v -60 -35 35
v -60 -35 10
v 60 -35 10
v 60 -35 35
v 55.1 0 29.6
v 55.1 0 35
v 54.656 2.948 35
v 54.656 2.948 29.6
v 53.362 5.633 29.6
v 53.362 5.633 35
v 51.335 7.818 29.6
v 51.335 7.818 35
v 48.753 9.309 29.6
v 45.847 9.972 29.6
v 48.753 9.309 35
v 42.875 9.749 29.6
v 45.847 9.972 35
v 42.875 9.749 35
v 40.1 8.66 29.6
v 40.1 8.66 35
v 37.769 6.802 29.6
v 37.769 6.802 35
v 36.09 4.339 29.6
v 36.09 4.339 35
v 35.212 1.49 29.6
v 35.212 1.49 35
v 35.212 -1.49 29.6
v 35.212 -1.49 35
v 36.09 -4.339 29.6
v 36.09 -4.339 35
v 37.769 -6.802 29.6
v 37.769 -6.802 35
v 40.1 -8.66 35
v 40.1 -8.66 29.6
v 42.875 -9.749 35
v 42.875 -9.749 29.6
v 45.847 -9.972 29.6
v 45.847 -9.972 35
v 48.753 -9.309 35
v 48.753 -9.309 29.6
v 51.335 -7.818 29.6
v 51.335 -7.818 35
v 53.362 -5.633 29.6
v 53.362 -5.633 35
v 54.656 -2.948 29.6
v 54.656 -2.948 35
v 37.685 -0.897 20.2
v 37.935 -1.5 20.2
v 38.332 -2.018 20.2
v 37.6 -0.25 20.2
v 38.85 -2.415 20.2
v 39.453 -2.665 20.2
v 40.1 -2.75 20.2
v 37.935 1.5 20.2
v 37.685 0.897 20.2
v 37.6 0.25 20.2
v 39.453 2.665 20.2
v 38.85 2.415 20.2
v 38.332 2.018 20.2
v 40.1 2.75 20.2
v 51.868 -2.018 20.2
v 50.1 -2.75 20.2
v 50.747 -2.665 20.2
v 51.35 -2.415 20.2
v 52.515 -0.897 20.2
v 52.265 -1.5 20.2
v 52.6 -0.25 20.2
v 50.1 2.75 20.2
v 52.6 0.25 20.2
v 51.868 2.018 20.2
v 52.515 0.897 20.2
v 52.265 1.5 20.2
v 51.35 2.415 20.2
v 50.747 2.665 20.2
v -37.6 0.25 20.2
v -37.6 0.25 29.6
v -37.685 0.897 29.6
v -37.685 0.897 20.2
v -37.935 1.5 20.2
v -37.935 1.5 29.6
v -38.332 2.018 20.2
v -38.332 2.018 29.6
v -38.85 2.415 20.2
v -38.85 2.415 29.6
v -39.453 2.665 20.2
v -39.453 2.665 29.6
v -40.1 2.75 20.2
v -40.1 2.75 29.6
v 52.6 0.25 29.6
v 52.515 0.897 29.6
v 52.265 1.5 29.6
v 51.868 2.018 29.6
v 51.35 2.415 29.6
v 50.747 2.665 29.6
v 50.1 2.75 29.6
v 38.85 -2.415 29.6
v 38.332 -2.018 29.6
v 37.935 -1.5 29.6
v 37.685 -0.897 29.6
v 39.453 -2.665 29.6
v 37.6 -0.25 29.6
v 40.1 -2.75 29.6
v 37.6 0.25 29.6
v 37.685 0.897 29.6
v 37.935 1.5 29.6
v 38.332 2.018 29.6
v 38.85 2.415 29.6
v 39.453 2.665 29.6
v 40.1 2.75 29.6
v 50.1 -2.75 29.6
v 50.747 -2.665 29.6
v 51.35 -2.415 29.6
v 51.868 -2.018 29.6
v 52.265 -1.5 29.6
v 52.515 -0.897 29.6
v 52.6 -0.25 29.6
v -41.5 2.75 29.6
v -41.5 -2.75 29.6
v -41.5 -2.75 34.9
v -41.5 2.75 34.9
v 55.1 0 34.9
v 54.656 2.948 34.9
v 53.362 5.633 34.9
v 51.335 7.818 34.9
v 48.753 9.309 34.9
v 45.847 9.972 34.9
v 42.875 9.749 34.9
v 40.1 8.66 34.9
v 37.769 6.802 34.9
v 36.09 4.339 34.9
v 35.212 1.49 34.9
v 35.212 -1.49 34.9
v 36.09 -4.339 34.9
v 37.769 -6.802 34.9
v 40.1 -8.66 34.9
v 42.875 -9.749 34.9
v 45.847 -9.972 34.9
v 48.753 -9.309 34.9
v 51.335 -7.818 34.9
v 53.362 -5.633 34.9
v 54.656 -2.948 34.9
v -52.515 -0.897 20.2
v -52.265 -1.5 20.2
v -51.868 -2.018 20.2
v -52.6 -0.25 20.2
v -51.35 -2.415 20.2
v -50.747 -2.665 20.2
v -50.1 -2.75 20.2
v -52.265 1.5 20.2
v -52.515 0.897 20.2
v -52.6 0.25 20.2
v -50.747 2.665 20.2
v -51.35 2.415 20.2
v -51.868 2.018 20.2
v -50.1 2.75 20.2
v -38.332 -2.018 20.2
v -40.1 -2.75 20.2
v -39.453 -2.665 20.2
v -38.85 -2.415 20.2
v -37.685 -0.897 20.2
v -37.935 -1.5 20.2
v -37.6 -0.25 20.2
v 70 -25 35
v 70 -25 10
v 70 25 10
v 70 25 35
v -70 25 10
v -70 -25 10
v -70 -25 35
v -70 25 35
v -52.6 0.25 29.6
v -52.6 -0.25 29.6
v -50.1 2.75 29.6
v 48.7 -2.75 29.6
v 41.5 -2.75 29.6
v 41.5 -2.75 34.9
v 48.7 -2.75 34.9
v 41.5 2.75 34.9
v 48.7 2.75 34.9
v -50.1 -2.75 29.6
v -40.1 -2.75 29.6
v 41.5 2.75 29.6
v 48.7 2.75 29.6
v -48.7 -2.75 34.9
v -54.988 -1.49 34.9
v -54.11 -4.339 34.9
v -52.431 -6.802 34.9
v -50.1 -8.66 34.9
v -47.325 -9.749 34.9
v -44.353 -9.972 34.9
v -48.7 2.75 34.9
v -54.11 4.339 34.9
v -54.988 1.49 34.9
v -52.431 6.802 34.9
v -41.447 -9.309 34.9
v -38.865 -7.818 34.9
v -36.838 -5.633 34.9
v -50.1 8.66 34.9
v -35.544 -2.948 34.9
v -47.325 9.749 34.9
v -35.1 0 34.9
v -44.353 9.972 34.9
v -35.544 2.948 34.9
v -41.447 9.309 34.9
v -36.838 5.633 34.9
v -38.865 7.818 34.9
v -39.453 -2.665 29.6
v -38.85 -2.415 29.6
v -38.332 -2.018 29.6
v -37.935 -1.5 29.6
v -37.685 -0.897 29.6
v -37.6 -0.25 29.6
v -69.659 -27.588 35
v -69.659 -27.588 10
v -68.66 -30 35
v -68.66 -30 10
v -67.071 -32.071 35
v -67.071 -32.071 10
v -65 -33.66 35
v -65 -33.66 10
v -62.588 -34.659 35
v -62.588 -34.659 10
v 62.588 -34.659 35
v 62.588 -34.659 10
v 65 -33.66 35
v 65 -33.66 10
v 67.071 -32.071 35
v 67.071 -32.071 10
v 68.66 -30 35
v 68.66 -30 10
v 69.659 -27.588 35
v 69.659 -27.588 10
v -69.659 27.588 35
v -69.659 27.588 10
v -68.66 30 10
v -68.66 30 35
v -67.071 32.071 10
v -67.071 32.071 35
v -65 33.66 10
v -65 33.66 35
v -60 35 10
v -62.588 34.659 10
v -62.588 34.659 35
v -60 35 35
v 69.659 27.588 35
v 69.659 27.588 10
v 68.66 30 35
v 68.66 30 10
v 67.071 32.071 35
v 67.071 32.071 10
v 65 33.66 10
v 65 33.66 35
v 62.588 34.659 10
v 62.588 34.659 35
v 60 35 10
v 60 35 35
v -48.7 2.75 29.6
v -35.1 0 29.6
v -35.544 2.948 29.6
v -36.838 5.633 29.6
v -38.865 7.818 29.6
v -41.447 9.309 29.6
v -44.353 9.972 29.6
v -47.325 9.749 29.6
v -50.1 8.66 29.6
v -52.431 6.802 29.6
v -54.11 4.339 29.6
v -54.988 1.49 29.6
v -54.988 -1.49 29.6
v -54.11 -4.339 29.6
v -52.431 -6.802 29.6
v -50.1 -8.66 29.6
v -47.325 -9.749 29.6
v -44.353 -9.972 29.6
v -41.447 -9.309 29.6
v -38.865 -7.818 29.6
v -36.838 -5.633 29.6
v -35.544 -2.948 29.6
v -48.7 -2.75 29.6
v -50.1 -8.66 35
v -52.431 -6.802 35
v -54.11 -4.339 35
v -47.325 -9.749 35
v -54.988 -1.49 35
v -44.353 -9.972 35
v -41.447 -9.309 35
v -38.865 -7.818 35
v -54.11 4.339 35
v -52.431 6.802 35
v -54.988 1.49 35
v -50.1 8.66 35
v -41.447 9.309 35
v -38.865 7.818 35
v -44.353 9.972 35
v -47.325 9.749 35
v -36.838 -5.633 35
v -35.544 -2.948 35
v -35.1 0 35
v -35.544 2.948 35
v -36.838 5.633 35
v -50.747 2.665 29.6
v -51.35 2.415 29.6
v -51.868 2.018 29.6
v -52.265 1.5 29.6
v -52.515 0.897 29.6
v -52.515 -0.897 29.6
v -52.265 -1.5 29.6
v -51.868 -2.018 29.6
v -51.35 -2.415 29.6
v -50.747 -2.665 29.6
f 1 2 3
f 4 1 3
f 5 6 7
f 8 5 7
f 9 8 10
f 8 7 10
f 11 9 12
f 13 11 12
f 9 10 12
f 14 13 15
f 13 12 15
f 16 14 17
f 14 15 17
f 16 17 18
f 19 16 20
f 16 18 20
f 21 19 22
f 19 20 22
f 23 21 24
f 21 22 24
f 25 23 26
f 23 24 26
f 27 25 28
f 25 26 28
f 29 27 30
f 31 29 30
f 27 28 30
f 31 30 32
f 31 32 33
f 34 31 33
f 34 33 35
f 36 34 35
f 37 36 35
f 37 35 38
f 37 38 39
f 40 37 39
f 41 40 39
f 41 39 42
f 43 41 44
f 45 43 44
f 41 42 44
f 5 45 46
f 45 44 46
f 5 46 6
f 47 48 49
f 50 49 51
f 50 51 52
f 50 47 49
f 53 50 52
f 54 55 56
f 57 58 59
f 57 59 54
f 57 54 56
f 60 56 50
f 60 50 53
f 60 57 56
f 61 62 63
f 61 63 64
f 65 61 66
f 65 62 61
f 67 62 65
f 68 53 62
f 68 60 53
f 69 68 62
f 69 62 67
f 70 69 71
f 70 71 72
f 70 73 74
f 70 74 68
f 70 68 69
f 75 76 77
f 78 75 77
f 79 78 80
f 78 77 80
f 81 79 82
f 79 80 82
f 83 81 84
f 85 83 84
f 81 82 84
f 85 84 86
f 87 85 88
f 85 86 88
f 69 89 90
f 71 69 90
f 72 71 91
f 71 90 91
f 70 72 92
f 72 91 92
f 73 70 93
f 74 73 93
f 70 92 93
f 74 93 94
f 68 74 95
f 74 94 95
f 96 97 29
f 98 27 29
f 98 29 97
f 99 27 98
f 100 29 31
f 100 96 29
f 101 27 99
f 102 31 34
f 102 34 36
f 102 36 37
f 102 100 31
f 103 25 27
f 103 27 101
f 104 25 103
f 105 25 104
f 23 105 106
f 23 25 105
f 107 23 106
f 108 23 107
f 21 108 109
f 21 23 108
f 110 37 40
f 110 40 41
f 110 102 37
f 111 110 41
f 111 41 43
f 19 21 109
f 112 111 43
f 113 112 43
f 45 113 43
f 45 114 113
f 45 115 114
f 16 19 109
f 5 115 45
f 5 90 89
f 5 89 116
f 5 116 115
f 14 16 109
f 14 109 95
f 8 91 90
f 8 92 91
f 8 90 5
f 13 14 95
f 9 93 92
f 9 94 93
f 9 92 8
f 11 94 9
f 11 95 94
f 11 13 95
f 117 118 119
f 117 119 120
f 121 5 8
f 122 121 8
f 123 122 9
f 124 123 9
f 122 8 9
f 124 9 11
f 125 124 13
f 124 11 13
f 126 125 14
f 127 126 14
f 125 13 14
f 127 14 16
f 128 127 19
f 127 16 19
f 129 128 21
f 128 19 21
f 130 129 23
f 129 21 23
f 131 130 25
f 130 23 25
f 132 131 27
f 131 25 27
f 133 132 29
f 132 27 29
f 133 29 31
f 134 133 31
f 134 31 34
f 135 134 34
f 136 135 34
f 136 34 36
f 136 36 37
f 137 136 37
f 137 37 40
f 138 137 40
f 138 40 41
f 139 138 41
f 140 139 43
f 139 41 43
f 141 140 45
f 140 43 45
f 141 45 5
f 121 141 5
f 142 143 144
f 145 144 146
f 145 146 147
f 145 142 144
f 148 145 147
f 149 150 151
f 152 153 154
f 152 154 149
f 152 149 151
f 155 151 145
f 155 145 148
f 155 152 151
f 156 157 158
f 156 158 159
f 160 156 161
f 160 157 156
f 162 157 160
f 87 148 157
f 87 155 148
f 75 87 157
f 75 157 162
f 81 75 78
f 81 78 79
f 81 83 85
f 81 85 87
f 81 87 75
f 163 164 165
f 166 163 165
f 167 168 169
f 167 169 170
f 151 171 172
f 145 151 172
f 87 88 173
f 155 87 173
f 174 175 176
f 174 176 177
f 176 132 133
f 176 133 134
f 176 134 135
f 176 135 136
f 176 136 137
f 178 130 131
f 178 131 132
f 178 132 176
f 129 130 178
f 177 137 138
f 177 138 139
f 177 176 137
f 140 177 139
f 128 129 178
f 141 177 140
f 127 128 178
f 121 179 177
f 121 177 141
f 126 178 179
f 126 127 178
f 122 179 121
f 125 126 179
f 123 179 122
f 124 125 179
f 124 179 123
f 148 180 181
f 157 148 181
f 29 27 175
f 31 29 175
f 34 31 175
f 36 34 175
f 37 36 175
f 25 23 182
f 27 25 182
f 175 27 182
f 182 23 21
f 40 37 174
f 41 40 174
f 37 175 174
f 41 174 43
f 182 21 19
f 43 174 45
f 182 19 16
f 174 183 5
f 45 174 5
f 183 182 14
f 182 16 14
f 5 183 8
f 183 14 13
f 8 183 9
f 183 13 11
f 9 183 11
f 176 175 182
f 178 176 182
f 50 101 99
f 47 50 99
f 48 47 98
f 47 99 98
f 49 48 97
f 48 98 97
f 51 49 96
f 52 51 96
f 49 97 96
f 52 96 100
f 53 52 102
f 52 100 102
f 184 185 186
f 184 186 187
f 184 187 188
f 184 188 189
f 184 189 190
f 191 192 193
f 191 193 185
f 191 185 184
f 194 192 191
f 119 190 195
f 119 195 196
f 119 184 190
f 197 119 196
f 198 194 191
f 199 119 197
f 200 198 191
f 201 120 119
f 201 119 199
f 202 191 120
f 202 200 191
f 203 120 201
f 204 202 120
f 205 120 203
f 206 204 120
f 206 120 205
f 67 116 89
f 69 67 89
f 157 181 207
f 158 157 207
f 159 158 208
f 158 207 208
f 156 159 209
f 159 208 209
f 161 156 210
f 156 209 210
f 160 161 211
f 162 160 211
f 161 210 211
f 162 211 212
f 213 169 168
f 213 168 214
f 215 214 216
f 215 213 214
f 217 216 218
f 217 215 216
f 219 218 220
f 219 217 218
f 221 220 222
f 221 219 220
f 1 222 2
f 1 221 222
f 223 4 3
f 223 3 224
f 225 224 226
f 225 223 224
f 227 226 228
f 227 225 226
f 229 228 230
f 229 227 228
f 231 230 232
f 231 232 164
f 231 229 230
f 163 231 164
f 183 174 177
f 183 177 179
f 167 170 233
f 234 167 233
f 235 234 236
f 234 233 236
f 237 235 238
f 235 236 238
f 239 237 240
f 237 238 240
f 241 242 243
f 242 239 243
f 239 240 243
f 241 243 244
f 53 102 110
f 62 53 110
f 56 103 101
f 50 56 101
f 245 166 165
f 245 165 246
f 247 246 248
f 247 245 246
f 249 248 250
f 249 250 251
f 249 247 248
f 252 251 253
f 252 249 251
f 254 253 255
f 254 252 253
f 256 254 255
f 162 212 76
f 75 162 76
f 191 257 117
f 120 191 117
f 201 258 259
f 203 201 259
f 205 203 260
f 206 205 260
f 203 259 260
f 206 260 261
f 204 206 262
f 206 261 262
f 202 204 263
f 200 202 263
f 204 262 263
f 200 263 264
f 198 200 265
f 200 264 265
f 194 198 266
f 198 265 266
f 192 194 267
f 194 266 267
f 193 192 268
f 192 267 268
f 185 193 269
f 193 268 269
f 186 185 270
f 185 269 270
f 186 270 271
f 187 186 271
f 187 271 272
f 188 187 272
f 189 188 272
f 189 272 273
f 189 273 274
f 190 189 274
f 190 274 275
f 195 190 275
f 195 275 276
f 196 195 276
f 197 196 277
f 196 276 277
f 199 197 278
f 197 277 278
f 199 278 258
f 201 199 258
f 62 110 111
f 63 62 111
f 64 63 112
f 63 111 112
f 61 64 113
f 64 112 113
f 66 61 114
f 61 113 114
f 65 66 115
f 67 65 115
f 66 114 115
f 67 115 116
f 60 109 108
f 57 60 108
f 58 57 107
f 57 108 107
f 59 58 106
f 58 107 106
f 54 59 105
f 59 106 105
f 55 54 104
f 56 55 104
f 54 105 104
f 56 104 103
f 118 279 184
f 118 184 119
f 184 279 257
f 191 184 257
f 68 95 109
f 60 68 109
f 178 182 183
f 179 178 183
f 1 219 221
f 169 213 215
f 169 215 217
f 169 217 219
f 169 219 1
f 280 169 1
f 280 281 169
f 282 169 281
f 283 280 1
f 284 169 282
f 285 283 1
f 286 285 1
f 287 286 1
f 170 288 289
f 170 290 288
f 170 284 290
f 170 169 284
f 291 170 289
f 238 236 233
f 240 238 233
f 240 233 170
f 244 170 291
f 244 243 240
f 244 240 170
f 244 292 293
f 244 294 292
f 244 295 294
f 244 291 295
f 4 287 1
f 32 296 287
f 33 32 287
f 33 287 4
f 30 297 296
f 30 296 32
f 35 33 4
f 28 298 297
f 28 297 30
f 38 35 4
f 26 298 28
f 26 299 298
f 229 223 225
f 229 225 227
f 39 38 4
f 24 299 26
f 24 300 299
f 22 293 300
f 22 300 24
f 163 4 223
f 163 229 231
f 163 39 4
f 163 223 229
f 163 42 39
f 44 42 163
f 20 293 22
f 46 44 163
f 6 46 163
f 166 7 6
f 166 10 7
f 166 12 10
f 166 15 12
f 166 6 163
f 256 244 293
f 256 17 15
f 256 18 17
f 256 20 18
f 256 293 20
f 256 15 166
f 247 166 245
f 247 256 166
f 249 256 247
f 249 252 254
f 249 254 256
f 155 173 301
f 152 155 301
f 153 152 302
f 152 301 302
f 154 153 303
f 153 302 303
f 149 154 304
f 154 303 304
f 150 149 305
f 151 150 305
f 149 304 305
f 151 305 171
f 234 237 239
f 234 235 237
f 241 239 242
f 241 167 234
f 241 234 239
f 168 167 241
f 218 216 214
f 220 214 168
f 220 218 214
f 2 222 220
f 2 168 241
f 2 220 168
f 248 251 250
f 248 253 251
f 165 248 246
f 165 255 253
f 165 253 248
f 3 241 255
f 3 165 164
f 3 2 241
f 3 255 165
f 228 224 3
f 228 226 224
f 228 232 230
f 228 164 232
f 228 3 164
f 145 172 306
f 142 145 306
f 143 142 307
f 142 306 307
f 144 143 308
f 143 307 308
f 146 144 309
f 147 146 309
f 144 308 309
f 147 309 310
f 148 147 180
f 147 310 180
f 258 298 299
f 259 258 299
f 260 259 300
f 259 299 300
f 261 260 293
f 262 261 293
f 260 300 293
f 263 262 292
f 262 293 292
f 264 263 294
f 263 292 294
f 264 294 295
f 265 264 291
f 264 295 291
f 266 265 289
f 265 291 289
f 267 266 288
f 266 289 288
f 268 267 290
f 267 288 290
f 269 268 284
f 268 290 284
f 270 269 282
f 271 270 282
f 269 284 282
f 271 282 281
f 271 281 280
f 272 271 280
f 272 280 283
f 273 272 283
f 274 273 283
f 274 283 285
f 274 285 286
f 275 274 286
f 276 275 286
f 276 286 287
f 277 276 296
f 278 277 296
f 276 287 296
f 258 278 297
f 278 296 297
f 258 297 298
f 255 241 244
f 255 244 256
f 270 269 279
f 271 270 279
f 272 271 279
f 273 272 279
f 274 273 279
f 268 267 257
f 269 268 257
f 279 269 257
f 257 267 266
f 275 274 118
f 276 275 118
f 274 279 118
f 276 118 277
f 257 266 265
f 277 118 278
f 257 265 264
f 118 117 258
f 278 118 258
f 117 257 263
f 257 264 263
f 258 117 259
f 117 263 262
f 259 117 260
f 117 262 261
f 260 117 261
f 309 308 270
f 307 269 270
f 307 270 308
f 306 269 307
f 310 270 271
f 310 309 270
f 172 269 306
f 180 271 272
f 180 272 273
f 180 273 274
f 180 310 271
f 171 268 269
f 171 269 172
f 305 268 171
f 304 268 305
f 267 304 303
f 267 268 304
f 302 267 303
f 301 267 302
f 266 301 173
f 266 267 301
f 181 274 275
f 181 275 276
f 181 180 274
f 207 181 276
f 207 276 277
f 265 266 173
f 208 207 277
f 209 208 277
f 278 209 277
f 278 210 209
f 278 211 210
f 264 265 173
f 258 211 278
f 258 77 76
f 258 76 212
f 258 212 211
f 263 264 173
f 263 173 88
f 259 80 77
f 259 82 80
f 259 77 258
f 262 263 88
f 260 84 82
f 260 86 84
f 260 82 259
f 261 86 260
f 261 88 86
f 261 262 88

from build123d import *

# Parameters (mm, degrees)
F0_W      = 140
F0_H      = 70
F1_DEPTH  = 35
F2_R      = 10
F3_R      = 10
F4_DEPTH  = 5.4
F6_DEPTH  = 9.4
F7_R      = 10
F7_W      = 7.2
F7_H      = 5.5
F8_DEPTH  = 5.3
F9_W      = 205.02191
F9_H      = 101.367414
F10_DEPTH = 10


with BuildPart() as f1:
    # F0 (on Top) → F1 (new body)
    with BuildSketch(Plane.XY):
        Rectangle(F0_W, F0_H)
    extrude(amount=F1_DEPTH)

    # F2
    f2_edges = [f1.edges().sort_by_distance(p)[0] for p in [
        (-70, -35, 17.5),
        (70, -35, 17.5),
        (70, 35, 17.5),
        (-70, 35, 17.5),
    ]]
    fillet(f2_edges, radius=F2_R)

    # F3 (on face) → F4 (cut)
    with BuildSketch(Plane.XY.offset(35)):
        with Locations((-45.1, 0)):
            Circle(F3_R)
        with Locations((45.1, 0)):
            Circle(F3_R)
    extrude(amount=-F4_DEPTH, mode=Mode.SUBTRACT)

    # F5 (on face) → F6 (cut)
    with BuildSketch(Plane.XY.offset(29.6)):
        with BuildLine():
            Line((-40.1, 2.75), (-50.1, 2.75))
            ThreePointArc((-50.1, 2.75), (-51.867767, 2.017767), (-52.6, 0.25))
            Line((-52.6, 0.25), (-52.6, -0.25))
            ThreePointArc((-52.6, -0.25), (-51.867767, -2.017767), (-50.1, -2.75))
            Line((-50.1, -2.75), (-40.1, -2.75))
            ThreePointArc((-40.1, -2.75), (-38.332233, -2.017767), (-37.6, -0.25))
            Line((-37.6, -0.25), (-37.6, 0.25))
            ThreePointArc((-37.6, 0.25), (-38.332233, 2.017767), (-40.1, 2.75))
        make_face()
        with BuildLine():
            Line((50.1, 2.75), (40.1, 2.75))
            ThreePointArc((40.1, 2.75), (38.332233, 2.017767), (37.6, 0.25))
            Line((37.6, 0.25), (37.6, -0.25))
            ThreePointArc((37.6, -0.25), (38.332233, -2.017767), (40.1, -2.75))
            Line((40.1, -2.75), (50.1, -2.75))
            ThreePointArc((50.1, -2.75), (51.867767, -2.017767), (52.6, -0.25))
            Line((52.6, -0.25), (52.6, 0.25))
            ThreePointArc((52.6, 0.25), (51.867767, 2.017767), (50.1, 2.75))
        make_face()
    extrude(amount=-F6_DEPTH, mode=Mode.SUBTRACT)

    # F9 (on face) → F10 (cut)
    with BuildSketch(Plane(origin=(0, 0, 0), x_dir=(1, 0, 0), z_dir=(0, 0, -1))):
        with Locations((7.608954, -8.668002)):
            Rectangle(F9_W, F9_H)
    extrude(amount=-F10_DEPTH, mode=Mode.SUBTRACT)


with BuildPart() as f8:
    # F7 (on face) → F8 (new body)
    with BuildSketch(Plane.XY.offset(29.6)):
        with Locations((-45.1, 0)):
            Circle(F7_R)
        with Locations((-45.1, 0)):
            Rectangle(F7_W, F7_H, mode=Mode.SUBTRACT)
        with Locations((45.1, 0)):
            Circle(F7_R)
        with Locations((45.1, 0)):
            Rectangle(F7_W, F7_H, mode=Mode.SUBTRACT)
    extrude(amount=F8_DEPTH)


solid = Compound([f1.part, f8.part])
